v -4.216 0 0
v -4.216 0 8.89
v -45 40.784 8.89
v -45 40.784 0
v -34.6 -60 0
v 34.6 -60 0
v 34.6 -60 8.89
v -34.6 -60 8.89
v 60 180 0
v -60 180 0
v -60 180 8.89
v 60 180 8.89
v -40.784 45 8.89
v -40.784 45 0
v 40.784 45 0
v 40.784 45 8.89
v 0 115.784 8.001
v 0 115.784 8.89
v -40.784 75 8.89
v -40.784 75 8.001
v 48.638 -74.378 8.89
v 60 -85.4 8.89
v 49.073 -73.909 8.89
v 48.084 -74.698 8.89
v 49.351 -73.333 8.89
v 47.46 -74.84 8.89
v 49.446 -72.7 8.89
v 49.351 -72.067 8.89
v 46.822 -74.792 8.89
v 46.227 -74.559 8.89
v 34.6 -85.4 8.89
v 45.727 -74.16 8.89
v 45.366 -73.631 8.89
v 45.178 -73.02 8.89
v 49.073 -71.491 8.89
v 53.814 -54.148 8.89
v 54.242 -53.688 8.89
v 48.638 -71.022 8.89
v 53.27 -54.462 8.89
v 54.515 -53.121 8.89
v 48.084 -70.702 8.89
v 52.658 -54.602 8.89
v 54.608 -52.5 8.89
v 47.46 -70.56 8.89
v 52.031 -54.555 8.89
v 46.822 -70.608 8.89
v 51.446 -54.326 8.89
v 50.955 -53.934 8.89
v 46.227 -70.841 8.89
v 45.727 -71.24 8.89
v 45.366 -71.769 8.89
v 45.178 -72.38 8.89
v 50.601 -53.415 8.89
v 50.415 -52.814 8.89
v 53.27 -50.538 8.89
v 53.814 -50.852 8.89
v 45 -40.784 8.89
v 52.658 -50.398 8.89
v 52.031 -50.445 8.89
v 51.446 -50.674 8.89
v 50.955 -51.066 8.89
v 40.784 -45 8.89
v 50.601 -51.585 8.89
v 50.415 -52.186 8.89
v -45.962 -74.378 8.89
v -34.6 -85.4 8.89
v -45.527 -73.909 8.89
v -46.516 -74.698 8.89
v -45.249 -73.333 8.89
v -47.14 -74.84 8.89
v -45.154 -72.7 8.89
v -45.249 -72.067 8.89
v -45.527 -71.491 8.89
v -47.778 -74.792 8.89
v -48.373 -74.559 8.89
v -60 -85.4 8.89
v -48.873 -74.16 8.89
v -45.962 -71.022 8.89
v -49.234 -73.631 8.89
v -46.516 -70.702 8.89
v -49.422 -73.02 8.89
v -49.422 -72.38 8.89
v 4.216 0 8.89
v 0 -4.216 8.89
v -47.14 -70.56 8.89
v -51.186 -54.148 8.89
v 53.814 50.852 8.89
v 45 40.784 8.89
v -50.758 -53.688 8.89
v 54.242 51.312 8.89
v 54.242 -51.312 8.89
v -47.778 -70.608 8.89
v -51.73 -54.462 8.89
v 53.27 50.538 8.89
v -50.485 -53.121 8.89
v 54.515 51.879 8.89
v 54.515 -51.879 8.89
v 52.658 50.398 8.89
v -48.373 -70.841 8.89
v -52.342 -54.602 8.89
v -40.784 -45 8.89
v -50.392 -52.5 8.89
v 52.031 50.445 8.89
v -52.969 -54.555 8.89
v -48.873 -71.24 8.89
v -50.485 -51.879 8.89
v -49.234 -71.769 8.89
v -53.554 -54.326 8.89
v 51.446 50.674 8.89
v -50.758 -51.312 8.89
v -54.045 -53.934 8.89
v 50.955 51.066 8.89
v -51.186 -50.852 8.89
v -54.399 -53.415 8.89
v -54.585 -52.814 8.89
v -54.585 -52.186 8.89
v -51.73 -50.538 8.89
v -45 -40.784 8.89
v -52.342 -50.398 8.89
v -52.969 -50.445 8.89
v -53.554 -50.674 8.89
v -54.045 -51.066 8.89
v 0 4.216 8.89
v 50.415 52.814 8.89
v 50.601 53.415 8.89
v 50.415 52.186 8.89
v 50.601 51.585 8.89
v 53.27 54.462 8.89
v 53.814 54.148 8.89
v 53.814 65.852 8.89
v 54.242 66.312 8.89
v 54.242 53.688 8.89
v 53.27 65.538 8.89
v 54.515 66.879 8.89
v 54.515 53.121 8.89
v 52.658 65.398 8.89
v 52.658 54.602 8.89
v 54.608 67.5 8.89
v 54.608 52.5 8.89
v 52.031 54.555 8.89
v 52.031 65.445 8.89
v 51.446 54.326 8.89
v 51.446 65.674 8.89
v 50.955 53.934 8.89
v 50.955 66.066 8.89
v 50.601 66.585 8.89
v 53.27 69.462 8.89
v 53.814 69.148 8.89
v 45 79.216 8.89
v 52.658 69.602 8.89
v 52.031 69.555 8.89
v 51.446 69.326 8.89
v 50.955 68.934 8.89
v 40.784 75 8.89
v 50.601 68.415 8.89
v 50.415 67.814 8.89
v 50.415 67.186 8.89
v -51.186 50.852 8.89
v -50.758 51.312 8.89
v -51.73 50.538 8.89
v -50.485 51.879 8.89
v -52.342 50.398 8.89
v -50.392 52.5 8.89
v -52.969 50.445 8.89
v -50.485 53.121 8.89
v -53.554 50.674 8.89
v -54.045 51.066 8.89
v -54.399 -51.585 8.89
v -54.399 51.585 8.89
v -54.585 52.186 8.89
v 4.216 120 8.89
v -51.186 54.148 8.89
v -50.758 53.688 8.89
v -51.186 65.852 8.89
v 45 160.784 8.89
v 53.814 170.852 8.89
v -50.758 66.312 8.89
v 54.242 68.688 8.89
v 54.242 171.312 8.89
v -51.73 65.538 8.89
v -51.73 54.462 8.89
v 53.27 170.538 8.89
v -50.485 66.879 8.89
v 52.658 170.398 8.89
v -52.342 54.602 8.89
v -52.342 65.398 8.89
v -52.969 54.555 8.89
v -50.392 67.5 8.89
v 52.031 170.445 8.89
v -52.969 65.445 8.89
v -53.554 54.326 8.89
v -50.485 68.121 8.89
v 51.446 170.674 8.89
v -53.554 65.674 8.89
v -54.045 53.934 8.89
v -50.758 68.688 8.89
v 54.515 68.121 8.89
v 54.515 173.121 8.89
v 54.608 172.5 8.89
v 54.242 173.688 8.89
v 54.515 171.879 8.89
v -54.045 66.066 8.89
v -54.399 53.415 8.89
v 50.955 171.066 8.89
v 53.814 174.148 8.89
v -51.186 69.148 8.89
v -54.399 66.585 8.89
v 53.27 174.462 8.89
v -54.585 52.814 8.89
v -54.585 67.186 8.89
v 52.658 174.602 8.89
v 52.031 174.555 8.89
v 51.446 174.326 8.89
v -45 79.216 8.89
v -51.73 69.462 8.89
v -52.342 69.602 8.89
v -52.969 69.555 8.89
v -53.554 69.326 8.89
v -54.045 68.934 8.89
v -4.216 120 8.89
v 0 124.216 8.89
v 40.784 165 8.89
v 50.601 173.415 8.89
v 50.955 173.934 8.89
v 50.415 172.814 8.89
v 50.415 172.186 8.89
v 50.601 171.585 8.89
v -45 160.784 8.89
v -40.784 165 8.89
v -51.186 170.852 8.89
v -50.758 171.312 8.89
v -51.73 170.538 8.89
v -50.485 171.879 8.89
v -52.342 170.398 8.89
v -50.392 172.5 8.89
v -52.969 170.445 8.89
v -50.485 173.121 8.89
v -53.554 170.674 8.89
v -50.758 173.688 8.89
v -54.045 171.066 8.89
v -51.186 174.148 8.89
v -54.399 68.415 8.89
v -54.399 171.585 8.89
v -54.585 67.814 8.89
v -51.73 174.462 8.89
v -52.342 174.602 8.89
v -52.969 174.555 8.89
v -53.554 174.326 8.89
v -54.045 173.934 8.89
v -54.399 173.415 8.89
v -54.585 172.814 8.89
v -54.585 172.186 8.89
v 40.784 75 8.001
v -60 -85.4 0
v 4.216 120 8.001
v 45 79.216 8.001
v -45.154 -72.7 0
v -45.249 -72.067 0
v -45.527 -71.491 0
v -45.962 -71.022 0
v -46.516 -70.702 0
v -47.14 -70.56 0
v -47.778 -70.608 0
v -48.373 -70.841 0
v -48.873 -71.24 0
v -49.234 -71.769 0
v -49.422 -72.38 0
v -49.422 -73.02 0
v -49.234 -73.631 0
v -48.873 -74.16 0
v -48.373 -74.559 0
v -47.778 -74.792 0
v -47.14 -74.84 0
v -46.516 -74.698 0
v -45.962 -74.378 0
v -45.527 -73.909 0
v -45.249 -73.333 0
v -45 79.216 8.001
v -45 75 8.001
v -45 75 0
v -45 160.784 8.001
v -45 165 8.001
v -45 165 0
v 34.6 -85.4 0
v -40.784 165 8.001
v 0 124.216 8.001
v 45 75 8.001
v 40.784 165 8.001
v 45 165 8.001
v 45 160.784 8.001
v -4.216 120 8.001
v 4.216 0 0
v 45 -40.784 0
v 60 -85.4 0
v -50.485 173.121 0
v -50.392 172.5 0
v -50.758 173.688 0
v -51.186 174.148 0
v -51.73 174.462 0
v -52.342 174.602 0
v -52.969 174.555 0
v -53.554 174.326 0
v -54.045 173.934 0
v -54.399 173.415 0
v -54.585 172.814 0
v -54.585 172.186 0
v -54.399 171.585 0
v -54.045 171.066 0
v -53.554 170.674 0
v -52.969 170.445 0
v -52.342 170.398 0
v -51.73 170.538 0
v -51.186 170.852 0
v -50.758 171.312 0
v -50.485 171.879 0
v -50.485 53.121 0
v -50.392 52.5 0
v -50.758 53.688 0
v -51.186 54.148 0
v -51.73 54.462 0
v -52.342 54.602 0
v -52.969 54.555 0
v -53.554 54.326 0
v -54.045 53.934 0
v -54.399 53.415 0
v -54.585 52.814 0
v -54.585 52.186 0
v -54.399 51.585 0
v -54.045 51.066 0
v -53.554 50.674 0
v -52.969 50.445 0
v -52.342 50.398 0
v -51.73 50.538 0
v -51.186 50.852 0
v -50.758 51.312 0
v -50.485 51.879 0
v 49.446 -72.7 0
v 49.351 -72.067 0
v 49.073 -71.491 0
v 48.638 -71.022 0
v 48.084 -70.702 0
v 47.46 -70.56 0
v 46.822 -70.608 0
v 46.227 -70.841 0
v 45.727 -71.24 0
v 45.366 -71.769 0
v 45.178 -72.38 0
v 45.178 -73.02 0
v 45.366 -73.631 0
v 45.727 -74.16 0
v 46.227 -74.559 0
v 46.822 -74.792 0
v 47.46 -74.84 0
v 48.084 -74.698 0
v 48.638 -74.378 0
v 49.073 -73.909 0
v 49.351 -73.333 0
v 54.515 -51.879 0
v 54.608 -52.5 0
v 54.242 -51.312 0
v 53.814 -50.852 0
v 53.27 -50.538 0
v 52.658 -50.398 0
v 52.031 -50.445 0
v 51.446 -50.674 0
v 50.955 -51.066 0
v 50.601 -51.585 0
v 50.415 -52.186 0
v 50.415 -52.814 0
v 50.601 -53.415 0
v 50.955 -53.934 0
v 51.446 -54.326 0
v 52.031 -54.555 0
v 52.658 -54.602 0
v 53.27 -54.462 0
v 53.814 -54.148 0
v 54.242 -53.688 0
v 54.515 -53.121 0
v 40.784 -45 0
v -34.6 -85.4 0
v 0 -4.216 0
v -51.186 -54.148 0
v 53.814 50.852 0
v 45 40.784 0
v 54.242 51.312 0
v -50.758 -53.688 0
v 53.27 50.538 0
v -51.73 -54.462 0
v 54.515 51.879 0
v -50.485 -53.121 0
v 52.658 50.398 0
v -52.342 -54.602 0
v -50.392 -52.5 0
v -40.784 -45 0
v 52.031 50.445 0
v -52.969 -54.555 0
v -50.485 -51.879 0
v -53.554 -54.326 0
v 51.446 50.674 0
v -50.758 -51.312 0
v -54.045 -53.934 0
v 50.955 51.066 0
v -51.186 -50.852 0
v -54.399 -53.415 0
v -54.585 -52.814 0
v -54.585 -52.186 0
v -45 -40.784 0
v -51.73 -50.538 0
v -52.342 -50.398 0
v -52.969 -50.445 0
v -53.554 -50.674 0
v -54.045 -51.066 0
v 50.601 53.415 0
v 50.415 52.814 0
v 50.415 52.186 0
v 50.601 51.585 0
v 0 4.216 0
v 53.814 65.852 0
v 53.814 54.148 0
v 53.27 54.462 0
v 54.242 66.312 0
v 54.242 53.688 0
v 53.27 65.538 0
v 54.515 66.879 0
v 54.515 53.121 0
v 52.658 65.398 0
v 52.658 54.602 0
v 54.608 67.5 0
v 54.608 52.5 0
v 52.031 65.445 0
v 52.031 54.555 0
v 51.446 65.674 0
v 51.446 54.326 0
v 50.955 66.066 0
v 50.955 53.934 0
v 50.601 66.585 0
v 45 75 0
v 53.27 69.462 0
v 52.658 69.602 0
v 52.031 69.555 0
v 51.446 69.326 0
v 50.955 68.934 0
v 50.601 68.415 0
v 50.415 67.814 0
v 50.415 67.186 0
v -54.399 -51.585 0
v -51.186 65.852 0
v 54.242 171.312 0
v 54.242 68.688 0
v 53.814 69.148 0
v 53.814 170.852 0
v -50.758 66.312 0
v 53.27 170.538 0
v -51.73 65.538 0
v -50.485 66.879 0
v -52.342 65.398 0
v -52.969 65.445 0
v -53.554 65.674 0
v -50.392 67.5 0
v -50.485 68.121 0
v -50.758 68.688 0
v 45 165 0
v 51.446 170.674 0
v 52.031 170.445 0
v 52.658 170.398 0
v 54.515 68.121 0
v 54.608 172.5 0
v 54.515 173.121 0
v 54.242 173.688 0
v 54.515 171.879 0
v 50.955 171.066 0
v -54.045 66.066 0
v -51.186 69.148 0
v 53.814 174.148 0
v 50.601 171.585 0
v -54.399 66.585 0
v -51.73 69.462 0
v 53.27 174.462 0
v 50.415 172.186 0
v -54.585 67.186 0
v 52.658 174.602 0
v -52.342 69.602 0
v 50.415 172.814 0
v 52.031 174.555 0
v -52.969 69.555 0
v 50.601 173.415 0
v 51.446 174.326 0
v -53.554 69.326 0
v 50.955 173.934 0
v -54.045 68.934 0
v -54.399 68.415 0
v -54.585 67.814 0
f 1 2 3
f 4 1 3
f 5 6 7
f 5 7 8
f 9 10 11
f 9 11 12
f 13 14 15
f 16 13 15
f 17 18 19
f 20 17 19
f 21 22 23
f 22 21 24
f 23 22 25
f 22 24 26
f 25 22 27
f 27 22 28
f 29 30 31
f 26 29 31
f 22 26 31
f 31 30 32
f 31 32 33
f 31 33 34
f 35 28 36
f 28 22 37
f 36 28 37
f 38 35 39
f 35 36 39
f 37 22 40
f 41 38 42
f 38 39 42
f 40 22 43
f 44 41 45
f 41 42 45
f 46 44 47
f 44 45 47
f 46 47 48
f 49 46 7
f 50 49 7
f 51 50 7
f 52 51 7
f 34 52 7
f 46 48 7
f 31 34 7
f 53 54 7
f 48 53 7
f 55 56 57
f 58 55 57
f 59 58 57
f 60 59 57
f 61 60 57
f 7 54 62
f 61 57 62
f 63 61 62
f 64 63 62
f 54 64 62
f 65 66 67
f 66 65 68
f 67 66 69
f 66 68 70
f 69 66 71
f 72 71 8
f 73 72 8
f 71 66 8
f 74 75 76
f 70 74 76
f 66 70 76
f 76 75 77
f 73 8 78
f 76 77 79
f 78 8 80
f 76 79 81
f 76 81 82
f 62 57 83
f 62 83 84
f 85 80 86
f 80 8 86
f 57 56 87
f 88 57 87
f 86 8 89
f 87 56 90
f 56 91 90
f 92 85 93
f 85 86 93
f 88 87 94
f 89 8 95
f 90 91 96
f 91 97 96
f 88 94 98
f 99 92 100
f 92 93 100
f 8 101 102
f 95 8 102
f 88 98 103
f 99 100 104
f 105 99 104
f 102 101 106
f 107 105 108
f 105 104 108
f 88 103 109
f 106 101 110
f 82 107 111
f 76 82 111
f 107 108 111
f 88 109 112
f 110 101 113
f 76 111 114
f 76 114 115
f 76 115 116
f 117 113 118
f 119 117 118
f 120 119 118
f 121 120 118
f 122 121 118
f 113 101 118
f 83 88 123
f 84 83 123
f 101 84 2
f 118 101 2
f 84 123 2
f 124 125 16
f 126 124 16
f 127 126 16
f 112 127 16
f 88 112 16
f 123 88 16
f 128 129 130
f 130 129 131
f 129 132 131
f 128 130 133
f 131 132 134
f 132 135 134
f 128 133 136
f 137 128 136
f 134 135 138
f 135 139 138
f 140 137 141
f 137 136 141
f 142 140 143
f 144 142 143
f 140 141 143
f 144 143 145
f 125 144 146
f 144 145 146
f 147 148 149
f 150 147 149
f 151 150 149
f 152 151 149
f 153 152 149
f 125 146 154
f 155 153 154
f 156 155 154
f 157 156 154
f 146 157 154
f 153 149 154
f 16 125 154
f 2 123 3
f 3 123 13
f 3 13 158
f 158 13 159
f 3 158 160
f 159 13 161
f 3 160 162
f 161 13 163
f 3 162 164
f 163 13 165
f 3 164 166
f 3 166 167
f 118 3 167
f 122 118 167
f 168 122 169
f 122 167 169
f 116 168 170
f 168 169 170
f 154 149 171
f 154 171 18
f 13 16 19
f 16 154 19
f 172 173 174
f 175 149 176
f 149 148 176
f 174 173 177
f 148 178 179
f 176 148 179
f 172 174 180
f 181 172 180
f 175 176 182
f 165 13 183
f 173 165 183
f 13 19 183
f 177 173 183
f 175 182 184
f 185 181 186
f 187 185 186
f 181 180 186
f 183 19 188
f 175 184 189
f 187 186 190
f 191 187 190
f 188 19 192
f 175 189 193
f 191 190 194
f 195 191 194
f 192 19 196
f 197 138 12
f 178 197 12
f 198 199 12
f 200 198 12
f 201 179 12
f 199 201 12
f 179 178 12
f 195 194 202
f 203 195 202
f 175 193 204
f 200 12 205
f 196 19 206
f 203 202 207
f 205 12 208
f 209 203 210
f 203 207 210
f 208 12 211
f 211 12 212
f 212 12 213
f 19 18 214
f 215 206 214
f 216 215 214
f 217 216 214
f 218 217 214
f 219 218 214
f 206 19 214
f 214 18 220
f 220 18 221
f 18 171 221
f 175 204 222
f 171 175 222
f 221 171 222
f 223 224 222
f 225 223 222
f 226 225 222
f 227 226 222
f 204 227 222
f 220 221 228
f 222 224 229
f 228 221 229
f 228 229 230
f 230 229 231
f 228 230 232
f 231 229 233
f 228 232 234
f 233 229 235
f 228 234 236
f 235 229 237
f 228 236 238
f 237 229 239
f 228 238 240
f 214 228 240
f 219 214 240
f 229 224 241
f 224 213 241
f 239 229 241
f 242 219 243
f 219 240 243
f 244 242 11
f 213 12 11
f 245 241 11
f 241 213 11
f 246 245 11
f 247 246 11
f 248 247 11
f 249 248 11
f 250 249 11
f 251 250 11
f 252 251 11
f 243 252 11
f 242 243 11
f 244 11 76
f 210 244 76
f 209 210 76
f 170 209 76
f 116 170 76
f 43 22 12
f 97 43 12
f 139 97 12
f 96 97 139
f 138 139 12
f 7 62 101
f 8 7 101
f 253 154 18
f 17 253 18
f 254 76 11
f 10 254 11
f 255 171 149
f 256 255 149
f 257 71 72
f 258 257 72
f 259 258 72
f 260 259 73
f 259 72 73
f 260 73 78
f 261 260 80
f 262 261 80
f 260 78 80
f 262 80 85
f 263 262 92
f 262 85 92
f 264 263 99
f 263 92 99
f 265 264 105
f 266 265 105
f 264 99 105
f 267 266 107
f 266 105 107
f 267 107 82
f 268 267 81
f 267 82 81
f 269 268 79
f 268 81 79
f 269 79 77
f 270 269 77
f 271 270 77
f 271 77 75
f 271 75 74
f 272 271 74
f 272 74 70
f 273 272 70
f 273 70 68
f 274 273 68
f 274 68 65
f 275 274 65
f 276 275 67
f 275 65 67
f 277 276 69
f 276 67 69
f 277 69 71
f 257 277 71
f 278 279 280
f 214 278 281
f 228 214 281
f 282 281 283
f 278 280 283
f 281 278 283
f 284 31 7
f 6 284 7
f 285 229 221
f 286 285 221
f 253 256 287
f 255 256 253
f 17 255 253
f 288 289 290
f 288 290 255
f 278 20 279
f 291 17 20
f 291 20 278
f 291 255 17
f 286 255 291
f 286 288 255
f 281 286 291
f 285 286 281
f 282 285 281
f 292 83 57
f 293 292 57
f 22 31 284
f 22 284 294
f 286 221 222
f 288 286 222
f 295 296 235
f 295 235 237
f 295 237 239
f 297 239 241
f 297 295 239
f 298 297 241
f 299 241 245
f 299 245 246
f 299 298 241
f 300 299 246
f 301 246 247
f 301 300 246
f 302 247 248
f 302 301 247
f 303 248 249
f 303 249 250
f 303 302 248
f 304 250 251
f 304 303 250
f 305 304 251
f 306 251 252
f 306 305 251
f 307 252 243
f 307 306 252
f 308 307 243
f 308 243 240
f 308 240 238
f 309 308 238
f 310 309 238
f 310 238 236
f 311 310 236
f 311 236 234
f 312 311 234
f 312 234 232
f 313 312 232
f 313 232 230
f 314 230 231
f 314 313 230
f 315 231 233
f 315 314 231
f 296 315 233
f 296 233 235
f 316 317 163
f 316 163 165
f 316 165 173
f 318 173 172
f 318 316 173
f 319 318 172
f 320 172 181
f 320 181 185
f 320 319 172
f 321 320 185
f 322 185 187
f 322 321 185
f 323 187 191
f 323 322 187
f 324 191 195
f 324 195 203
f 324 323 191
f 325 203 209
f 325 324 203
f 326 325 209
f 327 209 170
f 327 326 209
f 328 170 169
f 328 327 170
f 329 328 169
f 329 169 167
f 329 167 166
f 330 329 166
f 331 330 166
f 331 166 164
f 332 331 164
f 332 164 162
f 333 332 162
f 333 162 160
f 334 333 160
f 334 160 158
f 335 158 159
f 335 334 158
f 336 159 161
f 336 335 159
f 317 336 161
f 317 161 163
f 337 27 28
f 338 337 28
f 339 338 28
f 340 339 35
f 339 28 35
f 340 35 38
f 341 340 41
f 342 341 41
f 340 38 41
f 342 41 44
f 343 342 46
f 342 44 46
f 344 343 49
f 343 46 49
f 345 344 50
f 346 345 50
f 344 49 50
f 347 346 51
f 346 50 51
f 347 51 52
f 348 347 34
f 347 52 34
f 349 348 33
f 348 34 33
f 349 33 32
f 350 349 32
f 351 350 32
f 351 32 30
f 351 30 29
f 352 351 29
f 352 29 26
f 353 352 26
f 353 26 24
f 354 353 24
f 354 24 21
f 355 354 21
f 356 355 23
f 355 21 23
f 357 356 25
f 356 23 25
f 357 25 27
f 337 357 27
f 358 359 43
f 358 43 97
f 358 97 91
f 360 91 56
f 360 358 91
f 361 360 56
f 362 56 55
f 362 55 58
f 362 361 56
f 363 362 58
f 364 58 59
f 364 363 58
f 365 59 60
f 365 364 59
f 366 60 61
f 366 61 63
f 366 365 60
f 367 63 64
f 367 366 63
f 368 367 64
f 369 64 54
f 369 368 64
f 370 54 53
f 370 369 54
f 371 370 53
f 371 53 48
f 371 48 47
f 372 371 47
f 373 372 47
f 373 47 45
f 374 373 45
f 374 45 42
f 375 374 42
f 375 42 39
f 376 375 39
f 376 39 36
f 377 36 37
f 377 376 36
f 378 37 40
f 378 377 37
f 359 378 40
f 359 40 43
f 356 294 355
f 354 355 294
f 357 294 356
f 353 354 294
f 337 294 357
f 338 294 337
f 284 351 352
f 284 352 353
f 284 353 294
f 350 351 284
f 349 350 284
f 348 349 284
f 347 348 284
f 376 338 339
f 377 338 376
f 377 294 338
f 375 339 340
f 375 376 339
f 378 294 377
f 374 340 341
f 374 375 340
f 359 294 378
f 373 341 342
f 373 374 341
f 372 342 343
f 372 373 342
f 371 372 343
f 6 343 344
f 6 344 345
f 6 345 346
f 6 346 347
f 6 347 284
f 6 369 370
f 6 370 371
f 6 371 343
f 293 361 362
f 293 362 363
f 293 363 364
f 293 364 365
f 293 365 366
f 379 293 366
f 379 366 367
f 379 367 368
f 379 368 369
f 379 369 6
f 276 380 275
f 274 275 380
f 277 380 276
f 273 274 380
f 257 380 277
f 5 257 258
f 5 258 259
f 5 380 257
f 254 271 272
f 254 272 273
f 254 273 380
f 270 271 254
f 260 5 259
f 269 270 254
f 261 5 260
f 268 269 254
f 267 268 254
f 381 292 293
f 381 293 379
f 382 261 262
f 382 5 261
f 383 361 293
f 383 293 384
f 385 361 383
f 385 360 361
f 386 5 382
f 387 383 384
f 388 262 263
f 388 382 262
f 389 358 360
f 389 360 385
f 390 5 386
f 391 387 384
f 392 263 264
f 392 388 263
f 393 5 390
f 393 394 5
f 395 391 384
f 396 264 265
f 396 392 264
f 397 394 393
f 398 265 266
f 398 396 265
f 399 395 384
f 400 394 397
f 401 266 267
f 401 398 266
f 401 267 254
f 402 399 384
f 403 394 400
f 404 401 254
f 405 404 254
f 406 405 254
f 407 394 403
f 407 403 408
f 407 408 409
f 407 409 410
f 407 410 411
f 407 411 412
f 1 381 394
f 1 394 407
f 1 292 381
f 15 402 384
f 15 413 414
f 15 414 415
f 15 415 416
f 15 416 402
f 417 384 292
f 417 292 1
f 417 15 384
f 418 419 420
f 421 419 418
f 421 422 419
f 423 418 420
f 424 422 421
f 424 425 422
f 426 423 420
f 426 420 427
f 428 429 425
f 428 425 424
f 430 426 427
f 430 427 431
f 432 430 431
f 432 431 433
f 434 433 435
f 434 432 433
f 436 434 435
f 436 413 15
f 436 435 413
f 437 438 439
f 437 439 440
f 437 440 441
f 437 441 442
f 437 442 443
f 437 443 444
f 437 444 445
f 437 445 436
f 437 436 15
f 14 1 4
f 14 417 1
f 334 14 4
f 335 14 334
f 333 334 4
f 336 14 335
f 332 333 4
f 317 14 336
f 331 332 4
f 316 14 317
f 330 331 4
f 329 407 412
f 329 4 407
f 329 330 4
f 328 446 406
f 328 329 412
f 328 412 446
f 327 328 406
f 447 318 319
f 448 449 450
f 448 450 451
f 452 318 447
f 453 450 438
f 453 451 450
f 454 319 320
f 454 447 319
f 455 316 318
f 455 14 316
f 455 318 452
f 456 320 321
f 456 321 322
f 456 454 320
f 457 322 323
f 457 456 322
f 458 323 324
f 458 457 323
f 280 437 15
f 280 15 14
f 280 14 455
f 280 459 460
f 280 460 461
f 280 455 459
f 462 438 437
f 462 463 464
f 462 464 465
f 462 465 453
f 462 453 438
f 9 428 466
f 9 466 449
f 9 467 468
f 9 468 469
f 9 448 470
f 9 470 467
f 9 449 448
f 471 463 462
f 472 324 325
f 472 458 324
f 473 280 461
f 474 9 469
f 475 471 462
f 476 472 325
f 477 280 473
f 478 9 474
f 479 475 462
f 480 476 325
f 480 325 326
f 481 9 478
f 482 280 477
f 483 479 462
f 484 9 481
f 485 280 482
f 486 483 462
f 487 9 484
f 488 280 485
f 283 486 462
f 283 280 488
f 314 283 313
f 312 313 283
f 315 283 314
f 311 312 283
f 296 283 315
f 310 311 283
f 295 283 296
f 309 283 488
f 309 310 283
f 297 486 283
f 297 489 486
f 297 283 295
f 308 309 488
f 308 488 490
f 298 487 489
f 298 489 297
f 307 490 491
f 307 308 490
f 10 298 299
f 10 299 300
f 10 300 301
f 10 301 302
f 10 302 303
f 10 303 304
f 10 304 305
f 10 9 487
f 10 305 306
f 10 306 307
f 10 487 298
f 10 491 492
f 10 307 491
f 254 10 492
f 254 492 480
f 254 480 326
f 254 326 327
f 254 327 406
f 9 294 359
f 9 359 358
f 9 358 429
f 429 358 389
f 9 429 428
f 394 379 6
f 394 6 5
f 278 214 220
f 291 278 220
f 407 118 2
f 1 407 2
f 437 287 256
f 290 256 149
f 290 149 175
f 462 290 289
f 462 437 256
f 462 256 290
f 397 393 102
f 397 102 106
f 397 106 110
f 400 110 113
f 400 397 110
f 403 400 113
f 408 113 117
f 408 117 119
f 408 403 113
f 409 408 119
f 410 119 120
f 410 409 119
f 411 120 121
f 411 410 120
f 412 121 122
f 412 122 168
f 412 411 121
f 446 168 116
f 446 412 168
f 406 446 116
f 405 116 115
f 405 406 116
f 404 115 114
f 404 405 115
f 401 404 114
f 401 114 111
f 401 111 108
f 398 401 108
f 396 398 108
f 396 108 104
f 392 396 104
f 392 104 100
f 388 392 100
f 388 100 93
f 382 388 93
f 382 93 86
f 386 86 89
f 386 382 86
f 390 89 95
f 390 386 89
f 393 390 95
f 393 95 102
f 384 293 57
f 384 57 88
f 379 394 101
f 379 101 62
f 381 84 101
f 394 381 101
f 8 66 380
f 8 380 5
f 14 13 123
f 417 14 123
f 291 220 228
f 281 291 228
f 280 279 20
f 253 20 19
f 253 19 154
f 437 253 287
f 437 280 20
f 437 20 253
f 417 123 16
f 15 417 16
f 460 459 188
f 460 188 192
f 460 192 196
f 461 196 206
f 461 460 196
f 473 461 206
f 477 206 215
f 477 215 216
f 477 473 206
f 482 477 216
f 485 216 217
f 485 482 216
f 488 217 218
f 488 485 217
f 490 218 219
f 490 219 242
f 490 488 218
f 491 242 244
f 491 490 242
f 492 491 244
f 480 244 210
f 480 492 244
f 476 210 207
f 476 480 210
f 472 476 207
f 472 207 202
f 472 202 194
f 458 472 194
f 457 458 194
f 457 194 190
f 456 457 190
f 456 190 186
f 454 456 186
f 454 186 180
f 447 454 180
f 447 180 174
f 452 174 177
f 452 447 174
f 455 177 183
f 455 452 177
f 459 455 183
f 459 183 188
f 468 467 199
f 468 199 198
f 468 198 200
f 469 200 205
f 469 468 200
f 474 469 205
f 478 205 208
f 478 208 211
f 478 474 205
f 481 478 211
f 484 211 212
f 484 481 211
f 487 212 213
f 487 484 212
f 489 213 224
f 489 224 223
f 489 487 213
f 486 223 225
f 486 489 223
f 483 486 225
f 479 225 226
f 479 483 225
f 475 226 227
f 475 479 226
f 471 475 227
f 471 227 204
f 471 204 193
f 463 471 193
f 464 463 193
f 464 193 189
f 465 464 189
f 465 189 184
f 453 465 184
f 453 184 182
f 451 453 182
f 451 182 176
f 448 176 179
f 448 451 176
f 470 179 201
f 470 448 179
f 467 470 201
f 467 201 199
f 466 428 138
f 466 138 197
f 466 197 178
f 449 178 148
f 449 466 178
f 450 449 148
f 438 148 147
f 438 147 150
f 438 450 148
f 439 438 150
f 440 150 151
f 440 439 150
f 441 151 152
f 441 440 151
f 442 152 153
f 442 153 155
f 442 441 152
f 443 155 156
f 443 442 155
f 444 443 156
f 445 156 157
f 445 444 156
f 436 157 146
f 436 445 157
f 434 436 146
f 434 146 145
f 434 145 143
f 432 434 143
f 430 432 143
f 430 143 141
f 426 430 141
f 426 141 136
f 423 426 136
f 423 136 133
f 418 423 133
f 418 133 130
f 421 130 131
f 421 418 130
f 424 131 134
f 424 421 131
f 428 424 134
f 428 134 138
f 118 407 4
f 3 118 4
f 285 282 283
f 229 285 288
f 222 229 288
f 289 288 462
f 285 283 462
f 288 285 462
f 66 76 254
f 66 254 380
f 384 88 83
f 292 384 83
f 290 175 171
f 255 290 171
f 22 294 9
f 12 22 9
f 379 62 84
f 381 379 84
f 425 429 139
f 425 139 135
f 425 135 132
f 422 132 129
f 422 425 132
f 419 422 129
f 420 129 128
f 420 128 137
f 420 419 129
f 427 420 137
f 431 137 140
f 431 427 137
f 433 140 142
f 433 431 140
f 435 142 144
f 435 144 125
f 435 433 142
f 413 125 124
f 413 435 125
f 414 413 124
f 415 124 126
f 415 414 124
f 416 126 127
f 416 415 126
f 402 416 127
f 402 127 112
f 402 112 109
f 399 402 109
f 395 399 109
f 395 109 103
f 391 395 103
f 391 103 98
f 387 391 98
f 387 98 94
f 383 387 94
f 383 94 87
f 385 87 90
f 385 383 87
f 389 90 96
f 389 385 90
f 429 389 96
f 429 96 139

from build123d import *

# Parameters (mm, degrees)
SKETCH_R     = 2.1082
SKETCH_W     = 90
SKETCH_H     = 90
PAD_DEPTH    = 8.89
SKETCH001_W  = 25.4
SKETCH001_H  = 25.4
SKETCH001_R  = 2.1463
PAD001_DEPTH = 8.89
PAD002_DEPTH = 8.89
PAD003_DEPTH = 0.889


with BuildPart() as part:
    # Sketch → Pad (new body)
    with BuildSketch(Plane.XY):
        Polygon((60, 60), (60, -60), (-60, -60), (-60, 60), (-60, 180), (60, 180), align=None)
        with Locations((-52.5, 52.5)):
            Circle(SKETCH_R, mode=Mode.SUBTRACT)
        with Locations((52.5, 52.5)):
            Circle(SKETCH_R, mode=Mode.SUBTRACT)
        with Locations((-52.5, -52.5)):
            Circle(SKETCH_R, mode=Mode.SUBTRACT)
        with Locations((52.5, -52.5)):
            Circle(SKETCH_R, mode=Mode.SUBTRACT)
        with Locations((-52.5, 172.5)):
            Circle(SKETCH_R, mode=Mode.SUBTRACT)
        with Locations((52.5, 172.5)):
            Circle(SKETCH_R, mode=Mode.SUBTRACT)
        with Locations((52.5, 67.5)):
            Circle(SKETCH_R, mode=Mode.SUBTRACT)
        with Locations((-52.5, 67.5)):
            Circle(SKETCH_R, mode=Mode.SUBTRACT)
        Rectangle(SKETCH_W, SKETCH_H, mode=Mode.SUBTRACT)
        with Locations((0, 120)):
            Rectangle(SKETCH_W, SKETCH_H, mode=Mode.SUBTRACT)
    extrude(amount=PAD_DEPTH)

    # Sketch001 (on Face24 of Pad) → Pad001 (join)
    with BuildSketch(Plane.XY.offset(8.89)):
        with Locations((-47.3, -72.7)):
            Rectangle(SKETCH001_W, SKETCH001_H)
        with Locations((-47.3, -72.7)):
            Circle(SKETCH001_R, mode=Mode.SUBTRACT)
        with Locations((47.3, -72.7)):
            Rectangle(SKETCH001_W, SKETCH001_H)
        with Locations((47.3, -72.7)):
            Circle(SKETCH001_R, mode=Mode.SUBTRACT)
    extrude(amount=-PAD001_DEPTH)

    # Sketch002 (on Face5 of Pad001) → Pad002 (join)
    with BuildSketch(Plane.XY.offset(8.89)):
        Polygon((-45, -40.7836), (-4.2164, 0), (-45, 40.7836), (-45, 45), (-40.7836, 45), (0, 4.2164), (40.7836, 45), (45, 45), (45, 40.7836), (4.2164, 0), (45, -40.7836), (45, -45), (40.7836, -45), (0, -4.2164), (-40.7836, -45), (-45, -45), align=None)
    extrude(amount=-PAD002_DEPTH)

    # Sketch003 (on Face5 of Pad001) → Pad003 (join)
    with BuildSketch(Plane.XY.offset(8.89)):
        Polygon((-45, 75), (-45, 79.2164), (-4.2164, 120), (-45, 160.7836), (-45, 165), (-40.7836, 165), (0, 124.2164), (40.7836, 165), (45, 165), (45, 160.7836), (4.2164, 120), (45, 79.2164), (45, 75), (40.7836, 75), (0, 115.7836), (-40.7836, 75), align=None)
    extrude(amount=-PAD003_DEPTH)


solid = part.part
